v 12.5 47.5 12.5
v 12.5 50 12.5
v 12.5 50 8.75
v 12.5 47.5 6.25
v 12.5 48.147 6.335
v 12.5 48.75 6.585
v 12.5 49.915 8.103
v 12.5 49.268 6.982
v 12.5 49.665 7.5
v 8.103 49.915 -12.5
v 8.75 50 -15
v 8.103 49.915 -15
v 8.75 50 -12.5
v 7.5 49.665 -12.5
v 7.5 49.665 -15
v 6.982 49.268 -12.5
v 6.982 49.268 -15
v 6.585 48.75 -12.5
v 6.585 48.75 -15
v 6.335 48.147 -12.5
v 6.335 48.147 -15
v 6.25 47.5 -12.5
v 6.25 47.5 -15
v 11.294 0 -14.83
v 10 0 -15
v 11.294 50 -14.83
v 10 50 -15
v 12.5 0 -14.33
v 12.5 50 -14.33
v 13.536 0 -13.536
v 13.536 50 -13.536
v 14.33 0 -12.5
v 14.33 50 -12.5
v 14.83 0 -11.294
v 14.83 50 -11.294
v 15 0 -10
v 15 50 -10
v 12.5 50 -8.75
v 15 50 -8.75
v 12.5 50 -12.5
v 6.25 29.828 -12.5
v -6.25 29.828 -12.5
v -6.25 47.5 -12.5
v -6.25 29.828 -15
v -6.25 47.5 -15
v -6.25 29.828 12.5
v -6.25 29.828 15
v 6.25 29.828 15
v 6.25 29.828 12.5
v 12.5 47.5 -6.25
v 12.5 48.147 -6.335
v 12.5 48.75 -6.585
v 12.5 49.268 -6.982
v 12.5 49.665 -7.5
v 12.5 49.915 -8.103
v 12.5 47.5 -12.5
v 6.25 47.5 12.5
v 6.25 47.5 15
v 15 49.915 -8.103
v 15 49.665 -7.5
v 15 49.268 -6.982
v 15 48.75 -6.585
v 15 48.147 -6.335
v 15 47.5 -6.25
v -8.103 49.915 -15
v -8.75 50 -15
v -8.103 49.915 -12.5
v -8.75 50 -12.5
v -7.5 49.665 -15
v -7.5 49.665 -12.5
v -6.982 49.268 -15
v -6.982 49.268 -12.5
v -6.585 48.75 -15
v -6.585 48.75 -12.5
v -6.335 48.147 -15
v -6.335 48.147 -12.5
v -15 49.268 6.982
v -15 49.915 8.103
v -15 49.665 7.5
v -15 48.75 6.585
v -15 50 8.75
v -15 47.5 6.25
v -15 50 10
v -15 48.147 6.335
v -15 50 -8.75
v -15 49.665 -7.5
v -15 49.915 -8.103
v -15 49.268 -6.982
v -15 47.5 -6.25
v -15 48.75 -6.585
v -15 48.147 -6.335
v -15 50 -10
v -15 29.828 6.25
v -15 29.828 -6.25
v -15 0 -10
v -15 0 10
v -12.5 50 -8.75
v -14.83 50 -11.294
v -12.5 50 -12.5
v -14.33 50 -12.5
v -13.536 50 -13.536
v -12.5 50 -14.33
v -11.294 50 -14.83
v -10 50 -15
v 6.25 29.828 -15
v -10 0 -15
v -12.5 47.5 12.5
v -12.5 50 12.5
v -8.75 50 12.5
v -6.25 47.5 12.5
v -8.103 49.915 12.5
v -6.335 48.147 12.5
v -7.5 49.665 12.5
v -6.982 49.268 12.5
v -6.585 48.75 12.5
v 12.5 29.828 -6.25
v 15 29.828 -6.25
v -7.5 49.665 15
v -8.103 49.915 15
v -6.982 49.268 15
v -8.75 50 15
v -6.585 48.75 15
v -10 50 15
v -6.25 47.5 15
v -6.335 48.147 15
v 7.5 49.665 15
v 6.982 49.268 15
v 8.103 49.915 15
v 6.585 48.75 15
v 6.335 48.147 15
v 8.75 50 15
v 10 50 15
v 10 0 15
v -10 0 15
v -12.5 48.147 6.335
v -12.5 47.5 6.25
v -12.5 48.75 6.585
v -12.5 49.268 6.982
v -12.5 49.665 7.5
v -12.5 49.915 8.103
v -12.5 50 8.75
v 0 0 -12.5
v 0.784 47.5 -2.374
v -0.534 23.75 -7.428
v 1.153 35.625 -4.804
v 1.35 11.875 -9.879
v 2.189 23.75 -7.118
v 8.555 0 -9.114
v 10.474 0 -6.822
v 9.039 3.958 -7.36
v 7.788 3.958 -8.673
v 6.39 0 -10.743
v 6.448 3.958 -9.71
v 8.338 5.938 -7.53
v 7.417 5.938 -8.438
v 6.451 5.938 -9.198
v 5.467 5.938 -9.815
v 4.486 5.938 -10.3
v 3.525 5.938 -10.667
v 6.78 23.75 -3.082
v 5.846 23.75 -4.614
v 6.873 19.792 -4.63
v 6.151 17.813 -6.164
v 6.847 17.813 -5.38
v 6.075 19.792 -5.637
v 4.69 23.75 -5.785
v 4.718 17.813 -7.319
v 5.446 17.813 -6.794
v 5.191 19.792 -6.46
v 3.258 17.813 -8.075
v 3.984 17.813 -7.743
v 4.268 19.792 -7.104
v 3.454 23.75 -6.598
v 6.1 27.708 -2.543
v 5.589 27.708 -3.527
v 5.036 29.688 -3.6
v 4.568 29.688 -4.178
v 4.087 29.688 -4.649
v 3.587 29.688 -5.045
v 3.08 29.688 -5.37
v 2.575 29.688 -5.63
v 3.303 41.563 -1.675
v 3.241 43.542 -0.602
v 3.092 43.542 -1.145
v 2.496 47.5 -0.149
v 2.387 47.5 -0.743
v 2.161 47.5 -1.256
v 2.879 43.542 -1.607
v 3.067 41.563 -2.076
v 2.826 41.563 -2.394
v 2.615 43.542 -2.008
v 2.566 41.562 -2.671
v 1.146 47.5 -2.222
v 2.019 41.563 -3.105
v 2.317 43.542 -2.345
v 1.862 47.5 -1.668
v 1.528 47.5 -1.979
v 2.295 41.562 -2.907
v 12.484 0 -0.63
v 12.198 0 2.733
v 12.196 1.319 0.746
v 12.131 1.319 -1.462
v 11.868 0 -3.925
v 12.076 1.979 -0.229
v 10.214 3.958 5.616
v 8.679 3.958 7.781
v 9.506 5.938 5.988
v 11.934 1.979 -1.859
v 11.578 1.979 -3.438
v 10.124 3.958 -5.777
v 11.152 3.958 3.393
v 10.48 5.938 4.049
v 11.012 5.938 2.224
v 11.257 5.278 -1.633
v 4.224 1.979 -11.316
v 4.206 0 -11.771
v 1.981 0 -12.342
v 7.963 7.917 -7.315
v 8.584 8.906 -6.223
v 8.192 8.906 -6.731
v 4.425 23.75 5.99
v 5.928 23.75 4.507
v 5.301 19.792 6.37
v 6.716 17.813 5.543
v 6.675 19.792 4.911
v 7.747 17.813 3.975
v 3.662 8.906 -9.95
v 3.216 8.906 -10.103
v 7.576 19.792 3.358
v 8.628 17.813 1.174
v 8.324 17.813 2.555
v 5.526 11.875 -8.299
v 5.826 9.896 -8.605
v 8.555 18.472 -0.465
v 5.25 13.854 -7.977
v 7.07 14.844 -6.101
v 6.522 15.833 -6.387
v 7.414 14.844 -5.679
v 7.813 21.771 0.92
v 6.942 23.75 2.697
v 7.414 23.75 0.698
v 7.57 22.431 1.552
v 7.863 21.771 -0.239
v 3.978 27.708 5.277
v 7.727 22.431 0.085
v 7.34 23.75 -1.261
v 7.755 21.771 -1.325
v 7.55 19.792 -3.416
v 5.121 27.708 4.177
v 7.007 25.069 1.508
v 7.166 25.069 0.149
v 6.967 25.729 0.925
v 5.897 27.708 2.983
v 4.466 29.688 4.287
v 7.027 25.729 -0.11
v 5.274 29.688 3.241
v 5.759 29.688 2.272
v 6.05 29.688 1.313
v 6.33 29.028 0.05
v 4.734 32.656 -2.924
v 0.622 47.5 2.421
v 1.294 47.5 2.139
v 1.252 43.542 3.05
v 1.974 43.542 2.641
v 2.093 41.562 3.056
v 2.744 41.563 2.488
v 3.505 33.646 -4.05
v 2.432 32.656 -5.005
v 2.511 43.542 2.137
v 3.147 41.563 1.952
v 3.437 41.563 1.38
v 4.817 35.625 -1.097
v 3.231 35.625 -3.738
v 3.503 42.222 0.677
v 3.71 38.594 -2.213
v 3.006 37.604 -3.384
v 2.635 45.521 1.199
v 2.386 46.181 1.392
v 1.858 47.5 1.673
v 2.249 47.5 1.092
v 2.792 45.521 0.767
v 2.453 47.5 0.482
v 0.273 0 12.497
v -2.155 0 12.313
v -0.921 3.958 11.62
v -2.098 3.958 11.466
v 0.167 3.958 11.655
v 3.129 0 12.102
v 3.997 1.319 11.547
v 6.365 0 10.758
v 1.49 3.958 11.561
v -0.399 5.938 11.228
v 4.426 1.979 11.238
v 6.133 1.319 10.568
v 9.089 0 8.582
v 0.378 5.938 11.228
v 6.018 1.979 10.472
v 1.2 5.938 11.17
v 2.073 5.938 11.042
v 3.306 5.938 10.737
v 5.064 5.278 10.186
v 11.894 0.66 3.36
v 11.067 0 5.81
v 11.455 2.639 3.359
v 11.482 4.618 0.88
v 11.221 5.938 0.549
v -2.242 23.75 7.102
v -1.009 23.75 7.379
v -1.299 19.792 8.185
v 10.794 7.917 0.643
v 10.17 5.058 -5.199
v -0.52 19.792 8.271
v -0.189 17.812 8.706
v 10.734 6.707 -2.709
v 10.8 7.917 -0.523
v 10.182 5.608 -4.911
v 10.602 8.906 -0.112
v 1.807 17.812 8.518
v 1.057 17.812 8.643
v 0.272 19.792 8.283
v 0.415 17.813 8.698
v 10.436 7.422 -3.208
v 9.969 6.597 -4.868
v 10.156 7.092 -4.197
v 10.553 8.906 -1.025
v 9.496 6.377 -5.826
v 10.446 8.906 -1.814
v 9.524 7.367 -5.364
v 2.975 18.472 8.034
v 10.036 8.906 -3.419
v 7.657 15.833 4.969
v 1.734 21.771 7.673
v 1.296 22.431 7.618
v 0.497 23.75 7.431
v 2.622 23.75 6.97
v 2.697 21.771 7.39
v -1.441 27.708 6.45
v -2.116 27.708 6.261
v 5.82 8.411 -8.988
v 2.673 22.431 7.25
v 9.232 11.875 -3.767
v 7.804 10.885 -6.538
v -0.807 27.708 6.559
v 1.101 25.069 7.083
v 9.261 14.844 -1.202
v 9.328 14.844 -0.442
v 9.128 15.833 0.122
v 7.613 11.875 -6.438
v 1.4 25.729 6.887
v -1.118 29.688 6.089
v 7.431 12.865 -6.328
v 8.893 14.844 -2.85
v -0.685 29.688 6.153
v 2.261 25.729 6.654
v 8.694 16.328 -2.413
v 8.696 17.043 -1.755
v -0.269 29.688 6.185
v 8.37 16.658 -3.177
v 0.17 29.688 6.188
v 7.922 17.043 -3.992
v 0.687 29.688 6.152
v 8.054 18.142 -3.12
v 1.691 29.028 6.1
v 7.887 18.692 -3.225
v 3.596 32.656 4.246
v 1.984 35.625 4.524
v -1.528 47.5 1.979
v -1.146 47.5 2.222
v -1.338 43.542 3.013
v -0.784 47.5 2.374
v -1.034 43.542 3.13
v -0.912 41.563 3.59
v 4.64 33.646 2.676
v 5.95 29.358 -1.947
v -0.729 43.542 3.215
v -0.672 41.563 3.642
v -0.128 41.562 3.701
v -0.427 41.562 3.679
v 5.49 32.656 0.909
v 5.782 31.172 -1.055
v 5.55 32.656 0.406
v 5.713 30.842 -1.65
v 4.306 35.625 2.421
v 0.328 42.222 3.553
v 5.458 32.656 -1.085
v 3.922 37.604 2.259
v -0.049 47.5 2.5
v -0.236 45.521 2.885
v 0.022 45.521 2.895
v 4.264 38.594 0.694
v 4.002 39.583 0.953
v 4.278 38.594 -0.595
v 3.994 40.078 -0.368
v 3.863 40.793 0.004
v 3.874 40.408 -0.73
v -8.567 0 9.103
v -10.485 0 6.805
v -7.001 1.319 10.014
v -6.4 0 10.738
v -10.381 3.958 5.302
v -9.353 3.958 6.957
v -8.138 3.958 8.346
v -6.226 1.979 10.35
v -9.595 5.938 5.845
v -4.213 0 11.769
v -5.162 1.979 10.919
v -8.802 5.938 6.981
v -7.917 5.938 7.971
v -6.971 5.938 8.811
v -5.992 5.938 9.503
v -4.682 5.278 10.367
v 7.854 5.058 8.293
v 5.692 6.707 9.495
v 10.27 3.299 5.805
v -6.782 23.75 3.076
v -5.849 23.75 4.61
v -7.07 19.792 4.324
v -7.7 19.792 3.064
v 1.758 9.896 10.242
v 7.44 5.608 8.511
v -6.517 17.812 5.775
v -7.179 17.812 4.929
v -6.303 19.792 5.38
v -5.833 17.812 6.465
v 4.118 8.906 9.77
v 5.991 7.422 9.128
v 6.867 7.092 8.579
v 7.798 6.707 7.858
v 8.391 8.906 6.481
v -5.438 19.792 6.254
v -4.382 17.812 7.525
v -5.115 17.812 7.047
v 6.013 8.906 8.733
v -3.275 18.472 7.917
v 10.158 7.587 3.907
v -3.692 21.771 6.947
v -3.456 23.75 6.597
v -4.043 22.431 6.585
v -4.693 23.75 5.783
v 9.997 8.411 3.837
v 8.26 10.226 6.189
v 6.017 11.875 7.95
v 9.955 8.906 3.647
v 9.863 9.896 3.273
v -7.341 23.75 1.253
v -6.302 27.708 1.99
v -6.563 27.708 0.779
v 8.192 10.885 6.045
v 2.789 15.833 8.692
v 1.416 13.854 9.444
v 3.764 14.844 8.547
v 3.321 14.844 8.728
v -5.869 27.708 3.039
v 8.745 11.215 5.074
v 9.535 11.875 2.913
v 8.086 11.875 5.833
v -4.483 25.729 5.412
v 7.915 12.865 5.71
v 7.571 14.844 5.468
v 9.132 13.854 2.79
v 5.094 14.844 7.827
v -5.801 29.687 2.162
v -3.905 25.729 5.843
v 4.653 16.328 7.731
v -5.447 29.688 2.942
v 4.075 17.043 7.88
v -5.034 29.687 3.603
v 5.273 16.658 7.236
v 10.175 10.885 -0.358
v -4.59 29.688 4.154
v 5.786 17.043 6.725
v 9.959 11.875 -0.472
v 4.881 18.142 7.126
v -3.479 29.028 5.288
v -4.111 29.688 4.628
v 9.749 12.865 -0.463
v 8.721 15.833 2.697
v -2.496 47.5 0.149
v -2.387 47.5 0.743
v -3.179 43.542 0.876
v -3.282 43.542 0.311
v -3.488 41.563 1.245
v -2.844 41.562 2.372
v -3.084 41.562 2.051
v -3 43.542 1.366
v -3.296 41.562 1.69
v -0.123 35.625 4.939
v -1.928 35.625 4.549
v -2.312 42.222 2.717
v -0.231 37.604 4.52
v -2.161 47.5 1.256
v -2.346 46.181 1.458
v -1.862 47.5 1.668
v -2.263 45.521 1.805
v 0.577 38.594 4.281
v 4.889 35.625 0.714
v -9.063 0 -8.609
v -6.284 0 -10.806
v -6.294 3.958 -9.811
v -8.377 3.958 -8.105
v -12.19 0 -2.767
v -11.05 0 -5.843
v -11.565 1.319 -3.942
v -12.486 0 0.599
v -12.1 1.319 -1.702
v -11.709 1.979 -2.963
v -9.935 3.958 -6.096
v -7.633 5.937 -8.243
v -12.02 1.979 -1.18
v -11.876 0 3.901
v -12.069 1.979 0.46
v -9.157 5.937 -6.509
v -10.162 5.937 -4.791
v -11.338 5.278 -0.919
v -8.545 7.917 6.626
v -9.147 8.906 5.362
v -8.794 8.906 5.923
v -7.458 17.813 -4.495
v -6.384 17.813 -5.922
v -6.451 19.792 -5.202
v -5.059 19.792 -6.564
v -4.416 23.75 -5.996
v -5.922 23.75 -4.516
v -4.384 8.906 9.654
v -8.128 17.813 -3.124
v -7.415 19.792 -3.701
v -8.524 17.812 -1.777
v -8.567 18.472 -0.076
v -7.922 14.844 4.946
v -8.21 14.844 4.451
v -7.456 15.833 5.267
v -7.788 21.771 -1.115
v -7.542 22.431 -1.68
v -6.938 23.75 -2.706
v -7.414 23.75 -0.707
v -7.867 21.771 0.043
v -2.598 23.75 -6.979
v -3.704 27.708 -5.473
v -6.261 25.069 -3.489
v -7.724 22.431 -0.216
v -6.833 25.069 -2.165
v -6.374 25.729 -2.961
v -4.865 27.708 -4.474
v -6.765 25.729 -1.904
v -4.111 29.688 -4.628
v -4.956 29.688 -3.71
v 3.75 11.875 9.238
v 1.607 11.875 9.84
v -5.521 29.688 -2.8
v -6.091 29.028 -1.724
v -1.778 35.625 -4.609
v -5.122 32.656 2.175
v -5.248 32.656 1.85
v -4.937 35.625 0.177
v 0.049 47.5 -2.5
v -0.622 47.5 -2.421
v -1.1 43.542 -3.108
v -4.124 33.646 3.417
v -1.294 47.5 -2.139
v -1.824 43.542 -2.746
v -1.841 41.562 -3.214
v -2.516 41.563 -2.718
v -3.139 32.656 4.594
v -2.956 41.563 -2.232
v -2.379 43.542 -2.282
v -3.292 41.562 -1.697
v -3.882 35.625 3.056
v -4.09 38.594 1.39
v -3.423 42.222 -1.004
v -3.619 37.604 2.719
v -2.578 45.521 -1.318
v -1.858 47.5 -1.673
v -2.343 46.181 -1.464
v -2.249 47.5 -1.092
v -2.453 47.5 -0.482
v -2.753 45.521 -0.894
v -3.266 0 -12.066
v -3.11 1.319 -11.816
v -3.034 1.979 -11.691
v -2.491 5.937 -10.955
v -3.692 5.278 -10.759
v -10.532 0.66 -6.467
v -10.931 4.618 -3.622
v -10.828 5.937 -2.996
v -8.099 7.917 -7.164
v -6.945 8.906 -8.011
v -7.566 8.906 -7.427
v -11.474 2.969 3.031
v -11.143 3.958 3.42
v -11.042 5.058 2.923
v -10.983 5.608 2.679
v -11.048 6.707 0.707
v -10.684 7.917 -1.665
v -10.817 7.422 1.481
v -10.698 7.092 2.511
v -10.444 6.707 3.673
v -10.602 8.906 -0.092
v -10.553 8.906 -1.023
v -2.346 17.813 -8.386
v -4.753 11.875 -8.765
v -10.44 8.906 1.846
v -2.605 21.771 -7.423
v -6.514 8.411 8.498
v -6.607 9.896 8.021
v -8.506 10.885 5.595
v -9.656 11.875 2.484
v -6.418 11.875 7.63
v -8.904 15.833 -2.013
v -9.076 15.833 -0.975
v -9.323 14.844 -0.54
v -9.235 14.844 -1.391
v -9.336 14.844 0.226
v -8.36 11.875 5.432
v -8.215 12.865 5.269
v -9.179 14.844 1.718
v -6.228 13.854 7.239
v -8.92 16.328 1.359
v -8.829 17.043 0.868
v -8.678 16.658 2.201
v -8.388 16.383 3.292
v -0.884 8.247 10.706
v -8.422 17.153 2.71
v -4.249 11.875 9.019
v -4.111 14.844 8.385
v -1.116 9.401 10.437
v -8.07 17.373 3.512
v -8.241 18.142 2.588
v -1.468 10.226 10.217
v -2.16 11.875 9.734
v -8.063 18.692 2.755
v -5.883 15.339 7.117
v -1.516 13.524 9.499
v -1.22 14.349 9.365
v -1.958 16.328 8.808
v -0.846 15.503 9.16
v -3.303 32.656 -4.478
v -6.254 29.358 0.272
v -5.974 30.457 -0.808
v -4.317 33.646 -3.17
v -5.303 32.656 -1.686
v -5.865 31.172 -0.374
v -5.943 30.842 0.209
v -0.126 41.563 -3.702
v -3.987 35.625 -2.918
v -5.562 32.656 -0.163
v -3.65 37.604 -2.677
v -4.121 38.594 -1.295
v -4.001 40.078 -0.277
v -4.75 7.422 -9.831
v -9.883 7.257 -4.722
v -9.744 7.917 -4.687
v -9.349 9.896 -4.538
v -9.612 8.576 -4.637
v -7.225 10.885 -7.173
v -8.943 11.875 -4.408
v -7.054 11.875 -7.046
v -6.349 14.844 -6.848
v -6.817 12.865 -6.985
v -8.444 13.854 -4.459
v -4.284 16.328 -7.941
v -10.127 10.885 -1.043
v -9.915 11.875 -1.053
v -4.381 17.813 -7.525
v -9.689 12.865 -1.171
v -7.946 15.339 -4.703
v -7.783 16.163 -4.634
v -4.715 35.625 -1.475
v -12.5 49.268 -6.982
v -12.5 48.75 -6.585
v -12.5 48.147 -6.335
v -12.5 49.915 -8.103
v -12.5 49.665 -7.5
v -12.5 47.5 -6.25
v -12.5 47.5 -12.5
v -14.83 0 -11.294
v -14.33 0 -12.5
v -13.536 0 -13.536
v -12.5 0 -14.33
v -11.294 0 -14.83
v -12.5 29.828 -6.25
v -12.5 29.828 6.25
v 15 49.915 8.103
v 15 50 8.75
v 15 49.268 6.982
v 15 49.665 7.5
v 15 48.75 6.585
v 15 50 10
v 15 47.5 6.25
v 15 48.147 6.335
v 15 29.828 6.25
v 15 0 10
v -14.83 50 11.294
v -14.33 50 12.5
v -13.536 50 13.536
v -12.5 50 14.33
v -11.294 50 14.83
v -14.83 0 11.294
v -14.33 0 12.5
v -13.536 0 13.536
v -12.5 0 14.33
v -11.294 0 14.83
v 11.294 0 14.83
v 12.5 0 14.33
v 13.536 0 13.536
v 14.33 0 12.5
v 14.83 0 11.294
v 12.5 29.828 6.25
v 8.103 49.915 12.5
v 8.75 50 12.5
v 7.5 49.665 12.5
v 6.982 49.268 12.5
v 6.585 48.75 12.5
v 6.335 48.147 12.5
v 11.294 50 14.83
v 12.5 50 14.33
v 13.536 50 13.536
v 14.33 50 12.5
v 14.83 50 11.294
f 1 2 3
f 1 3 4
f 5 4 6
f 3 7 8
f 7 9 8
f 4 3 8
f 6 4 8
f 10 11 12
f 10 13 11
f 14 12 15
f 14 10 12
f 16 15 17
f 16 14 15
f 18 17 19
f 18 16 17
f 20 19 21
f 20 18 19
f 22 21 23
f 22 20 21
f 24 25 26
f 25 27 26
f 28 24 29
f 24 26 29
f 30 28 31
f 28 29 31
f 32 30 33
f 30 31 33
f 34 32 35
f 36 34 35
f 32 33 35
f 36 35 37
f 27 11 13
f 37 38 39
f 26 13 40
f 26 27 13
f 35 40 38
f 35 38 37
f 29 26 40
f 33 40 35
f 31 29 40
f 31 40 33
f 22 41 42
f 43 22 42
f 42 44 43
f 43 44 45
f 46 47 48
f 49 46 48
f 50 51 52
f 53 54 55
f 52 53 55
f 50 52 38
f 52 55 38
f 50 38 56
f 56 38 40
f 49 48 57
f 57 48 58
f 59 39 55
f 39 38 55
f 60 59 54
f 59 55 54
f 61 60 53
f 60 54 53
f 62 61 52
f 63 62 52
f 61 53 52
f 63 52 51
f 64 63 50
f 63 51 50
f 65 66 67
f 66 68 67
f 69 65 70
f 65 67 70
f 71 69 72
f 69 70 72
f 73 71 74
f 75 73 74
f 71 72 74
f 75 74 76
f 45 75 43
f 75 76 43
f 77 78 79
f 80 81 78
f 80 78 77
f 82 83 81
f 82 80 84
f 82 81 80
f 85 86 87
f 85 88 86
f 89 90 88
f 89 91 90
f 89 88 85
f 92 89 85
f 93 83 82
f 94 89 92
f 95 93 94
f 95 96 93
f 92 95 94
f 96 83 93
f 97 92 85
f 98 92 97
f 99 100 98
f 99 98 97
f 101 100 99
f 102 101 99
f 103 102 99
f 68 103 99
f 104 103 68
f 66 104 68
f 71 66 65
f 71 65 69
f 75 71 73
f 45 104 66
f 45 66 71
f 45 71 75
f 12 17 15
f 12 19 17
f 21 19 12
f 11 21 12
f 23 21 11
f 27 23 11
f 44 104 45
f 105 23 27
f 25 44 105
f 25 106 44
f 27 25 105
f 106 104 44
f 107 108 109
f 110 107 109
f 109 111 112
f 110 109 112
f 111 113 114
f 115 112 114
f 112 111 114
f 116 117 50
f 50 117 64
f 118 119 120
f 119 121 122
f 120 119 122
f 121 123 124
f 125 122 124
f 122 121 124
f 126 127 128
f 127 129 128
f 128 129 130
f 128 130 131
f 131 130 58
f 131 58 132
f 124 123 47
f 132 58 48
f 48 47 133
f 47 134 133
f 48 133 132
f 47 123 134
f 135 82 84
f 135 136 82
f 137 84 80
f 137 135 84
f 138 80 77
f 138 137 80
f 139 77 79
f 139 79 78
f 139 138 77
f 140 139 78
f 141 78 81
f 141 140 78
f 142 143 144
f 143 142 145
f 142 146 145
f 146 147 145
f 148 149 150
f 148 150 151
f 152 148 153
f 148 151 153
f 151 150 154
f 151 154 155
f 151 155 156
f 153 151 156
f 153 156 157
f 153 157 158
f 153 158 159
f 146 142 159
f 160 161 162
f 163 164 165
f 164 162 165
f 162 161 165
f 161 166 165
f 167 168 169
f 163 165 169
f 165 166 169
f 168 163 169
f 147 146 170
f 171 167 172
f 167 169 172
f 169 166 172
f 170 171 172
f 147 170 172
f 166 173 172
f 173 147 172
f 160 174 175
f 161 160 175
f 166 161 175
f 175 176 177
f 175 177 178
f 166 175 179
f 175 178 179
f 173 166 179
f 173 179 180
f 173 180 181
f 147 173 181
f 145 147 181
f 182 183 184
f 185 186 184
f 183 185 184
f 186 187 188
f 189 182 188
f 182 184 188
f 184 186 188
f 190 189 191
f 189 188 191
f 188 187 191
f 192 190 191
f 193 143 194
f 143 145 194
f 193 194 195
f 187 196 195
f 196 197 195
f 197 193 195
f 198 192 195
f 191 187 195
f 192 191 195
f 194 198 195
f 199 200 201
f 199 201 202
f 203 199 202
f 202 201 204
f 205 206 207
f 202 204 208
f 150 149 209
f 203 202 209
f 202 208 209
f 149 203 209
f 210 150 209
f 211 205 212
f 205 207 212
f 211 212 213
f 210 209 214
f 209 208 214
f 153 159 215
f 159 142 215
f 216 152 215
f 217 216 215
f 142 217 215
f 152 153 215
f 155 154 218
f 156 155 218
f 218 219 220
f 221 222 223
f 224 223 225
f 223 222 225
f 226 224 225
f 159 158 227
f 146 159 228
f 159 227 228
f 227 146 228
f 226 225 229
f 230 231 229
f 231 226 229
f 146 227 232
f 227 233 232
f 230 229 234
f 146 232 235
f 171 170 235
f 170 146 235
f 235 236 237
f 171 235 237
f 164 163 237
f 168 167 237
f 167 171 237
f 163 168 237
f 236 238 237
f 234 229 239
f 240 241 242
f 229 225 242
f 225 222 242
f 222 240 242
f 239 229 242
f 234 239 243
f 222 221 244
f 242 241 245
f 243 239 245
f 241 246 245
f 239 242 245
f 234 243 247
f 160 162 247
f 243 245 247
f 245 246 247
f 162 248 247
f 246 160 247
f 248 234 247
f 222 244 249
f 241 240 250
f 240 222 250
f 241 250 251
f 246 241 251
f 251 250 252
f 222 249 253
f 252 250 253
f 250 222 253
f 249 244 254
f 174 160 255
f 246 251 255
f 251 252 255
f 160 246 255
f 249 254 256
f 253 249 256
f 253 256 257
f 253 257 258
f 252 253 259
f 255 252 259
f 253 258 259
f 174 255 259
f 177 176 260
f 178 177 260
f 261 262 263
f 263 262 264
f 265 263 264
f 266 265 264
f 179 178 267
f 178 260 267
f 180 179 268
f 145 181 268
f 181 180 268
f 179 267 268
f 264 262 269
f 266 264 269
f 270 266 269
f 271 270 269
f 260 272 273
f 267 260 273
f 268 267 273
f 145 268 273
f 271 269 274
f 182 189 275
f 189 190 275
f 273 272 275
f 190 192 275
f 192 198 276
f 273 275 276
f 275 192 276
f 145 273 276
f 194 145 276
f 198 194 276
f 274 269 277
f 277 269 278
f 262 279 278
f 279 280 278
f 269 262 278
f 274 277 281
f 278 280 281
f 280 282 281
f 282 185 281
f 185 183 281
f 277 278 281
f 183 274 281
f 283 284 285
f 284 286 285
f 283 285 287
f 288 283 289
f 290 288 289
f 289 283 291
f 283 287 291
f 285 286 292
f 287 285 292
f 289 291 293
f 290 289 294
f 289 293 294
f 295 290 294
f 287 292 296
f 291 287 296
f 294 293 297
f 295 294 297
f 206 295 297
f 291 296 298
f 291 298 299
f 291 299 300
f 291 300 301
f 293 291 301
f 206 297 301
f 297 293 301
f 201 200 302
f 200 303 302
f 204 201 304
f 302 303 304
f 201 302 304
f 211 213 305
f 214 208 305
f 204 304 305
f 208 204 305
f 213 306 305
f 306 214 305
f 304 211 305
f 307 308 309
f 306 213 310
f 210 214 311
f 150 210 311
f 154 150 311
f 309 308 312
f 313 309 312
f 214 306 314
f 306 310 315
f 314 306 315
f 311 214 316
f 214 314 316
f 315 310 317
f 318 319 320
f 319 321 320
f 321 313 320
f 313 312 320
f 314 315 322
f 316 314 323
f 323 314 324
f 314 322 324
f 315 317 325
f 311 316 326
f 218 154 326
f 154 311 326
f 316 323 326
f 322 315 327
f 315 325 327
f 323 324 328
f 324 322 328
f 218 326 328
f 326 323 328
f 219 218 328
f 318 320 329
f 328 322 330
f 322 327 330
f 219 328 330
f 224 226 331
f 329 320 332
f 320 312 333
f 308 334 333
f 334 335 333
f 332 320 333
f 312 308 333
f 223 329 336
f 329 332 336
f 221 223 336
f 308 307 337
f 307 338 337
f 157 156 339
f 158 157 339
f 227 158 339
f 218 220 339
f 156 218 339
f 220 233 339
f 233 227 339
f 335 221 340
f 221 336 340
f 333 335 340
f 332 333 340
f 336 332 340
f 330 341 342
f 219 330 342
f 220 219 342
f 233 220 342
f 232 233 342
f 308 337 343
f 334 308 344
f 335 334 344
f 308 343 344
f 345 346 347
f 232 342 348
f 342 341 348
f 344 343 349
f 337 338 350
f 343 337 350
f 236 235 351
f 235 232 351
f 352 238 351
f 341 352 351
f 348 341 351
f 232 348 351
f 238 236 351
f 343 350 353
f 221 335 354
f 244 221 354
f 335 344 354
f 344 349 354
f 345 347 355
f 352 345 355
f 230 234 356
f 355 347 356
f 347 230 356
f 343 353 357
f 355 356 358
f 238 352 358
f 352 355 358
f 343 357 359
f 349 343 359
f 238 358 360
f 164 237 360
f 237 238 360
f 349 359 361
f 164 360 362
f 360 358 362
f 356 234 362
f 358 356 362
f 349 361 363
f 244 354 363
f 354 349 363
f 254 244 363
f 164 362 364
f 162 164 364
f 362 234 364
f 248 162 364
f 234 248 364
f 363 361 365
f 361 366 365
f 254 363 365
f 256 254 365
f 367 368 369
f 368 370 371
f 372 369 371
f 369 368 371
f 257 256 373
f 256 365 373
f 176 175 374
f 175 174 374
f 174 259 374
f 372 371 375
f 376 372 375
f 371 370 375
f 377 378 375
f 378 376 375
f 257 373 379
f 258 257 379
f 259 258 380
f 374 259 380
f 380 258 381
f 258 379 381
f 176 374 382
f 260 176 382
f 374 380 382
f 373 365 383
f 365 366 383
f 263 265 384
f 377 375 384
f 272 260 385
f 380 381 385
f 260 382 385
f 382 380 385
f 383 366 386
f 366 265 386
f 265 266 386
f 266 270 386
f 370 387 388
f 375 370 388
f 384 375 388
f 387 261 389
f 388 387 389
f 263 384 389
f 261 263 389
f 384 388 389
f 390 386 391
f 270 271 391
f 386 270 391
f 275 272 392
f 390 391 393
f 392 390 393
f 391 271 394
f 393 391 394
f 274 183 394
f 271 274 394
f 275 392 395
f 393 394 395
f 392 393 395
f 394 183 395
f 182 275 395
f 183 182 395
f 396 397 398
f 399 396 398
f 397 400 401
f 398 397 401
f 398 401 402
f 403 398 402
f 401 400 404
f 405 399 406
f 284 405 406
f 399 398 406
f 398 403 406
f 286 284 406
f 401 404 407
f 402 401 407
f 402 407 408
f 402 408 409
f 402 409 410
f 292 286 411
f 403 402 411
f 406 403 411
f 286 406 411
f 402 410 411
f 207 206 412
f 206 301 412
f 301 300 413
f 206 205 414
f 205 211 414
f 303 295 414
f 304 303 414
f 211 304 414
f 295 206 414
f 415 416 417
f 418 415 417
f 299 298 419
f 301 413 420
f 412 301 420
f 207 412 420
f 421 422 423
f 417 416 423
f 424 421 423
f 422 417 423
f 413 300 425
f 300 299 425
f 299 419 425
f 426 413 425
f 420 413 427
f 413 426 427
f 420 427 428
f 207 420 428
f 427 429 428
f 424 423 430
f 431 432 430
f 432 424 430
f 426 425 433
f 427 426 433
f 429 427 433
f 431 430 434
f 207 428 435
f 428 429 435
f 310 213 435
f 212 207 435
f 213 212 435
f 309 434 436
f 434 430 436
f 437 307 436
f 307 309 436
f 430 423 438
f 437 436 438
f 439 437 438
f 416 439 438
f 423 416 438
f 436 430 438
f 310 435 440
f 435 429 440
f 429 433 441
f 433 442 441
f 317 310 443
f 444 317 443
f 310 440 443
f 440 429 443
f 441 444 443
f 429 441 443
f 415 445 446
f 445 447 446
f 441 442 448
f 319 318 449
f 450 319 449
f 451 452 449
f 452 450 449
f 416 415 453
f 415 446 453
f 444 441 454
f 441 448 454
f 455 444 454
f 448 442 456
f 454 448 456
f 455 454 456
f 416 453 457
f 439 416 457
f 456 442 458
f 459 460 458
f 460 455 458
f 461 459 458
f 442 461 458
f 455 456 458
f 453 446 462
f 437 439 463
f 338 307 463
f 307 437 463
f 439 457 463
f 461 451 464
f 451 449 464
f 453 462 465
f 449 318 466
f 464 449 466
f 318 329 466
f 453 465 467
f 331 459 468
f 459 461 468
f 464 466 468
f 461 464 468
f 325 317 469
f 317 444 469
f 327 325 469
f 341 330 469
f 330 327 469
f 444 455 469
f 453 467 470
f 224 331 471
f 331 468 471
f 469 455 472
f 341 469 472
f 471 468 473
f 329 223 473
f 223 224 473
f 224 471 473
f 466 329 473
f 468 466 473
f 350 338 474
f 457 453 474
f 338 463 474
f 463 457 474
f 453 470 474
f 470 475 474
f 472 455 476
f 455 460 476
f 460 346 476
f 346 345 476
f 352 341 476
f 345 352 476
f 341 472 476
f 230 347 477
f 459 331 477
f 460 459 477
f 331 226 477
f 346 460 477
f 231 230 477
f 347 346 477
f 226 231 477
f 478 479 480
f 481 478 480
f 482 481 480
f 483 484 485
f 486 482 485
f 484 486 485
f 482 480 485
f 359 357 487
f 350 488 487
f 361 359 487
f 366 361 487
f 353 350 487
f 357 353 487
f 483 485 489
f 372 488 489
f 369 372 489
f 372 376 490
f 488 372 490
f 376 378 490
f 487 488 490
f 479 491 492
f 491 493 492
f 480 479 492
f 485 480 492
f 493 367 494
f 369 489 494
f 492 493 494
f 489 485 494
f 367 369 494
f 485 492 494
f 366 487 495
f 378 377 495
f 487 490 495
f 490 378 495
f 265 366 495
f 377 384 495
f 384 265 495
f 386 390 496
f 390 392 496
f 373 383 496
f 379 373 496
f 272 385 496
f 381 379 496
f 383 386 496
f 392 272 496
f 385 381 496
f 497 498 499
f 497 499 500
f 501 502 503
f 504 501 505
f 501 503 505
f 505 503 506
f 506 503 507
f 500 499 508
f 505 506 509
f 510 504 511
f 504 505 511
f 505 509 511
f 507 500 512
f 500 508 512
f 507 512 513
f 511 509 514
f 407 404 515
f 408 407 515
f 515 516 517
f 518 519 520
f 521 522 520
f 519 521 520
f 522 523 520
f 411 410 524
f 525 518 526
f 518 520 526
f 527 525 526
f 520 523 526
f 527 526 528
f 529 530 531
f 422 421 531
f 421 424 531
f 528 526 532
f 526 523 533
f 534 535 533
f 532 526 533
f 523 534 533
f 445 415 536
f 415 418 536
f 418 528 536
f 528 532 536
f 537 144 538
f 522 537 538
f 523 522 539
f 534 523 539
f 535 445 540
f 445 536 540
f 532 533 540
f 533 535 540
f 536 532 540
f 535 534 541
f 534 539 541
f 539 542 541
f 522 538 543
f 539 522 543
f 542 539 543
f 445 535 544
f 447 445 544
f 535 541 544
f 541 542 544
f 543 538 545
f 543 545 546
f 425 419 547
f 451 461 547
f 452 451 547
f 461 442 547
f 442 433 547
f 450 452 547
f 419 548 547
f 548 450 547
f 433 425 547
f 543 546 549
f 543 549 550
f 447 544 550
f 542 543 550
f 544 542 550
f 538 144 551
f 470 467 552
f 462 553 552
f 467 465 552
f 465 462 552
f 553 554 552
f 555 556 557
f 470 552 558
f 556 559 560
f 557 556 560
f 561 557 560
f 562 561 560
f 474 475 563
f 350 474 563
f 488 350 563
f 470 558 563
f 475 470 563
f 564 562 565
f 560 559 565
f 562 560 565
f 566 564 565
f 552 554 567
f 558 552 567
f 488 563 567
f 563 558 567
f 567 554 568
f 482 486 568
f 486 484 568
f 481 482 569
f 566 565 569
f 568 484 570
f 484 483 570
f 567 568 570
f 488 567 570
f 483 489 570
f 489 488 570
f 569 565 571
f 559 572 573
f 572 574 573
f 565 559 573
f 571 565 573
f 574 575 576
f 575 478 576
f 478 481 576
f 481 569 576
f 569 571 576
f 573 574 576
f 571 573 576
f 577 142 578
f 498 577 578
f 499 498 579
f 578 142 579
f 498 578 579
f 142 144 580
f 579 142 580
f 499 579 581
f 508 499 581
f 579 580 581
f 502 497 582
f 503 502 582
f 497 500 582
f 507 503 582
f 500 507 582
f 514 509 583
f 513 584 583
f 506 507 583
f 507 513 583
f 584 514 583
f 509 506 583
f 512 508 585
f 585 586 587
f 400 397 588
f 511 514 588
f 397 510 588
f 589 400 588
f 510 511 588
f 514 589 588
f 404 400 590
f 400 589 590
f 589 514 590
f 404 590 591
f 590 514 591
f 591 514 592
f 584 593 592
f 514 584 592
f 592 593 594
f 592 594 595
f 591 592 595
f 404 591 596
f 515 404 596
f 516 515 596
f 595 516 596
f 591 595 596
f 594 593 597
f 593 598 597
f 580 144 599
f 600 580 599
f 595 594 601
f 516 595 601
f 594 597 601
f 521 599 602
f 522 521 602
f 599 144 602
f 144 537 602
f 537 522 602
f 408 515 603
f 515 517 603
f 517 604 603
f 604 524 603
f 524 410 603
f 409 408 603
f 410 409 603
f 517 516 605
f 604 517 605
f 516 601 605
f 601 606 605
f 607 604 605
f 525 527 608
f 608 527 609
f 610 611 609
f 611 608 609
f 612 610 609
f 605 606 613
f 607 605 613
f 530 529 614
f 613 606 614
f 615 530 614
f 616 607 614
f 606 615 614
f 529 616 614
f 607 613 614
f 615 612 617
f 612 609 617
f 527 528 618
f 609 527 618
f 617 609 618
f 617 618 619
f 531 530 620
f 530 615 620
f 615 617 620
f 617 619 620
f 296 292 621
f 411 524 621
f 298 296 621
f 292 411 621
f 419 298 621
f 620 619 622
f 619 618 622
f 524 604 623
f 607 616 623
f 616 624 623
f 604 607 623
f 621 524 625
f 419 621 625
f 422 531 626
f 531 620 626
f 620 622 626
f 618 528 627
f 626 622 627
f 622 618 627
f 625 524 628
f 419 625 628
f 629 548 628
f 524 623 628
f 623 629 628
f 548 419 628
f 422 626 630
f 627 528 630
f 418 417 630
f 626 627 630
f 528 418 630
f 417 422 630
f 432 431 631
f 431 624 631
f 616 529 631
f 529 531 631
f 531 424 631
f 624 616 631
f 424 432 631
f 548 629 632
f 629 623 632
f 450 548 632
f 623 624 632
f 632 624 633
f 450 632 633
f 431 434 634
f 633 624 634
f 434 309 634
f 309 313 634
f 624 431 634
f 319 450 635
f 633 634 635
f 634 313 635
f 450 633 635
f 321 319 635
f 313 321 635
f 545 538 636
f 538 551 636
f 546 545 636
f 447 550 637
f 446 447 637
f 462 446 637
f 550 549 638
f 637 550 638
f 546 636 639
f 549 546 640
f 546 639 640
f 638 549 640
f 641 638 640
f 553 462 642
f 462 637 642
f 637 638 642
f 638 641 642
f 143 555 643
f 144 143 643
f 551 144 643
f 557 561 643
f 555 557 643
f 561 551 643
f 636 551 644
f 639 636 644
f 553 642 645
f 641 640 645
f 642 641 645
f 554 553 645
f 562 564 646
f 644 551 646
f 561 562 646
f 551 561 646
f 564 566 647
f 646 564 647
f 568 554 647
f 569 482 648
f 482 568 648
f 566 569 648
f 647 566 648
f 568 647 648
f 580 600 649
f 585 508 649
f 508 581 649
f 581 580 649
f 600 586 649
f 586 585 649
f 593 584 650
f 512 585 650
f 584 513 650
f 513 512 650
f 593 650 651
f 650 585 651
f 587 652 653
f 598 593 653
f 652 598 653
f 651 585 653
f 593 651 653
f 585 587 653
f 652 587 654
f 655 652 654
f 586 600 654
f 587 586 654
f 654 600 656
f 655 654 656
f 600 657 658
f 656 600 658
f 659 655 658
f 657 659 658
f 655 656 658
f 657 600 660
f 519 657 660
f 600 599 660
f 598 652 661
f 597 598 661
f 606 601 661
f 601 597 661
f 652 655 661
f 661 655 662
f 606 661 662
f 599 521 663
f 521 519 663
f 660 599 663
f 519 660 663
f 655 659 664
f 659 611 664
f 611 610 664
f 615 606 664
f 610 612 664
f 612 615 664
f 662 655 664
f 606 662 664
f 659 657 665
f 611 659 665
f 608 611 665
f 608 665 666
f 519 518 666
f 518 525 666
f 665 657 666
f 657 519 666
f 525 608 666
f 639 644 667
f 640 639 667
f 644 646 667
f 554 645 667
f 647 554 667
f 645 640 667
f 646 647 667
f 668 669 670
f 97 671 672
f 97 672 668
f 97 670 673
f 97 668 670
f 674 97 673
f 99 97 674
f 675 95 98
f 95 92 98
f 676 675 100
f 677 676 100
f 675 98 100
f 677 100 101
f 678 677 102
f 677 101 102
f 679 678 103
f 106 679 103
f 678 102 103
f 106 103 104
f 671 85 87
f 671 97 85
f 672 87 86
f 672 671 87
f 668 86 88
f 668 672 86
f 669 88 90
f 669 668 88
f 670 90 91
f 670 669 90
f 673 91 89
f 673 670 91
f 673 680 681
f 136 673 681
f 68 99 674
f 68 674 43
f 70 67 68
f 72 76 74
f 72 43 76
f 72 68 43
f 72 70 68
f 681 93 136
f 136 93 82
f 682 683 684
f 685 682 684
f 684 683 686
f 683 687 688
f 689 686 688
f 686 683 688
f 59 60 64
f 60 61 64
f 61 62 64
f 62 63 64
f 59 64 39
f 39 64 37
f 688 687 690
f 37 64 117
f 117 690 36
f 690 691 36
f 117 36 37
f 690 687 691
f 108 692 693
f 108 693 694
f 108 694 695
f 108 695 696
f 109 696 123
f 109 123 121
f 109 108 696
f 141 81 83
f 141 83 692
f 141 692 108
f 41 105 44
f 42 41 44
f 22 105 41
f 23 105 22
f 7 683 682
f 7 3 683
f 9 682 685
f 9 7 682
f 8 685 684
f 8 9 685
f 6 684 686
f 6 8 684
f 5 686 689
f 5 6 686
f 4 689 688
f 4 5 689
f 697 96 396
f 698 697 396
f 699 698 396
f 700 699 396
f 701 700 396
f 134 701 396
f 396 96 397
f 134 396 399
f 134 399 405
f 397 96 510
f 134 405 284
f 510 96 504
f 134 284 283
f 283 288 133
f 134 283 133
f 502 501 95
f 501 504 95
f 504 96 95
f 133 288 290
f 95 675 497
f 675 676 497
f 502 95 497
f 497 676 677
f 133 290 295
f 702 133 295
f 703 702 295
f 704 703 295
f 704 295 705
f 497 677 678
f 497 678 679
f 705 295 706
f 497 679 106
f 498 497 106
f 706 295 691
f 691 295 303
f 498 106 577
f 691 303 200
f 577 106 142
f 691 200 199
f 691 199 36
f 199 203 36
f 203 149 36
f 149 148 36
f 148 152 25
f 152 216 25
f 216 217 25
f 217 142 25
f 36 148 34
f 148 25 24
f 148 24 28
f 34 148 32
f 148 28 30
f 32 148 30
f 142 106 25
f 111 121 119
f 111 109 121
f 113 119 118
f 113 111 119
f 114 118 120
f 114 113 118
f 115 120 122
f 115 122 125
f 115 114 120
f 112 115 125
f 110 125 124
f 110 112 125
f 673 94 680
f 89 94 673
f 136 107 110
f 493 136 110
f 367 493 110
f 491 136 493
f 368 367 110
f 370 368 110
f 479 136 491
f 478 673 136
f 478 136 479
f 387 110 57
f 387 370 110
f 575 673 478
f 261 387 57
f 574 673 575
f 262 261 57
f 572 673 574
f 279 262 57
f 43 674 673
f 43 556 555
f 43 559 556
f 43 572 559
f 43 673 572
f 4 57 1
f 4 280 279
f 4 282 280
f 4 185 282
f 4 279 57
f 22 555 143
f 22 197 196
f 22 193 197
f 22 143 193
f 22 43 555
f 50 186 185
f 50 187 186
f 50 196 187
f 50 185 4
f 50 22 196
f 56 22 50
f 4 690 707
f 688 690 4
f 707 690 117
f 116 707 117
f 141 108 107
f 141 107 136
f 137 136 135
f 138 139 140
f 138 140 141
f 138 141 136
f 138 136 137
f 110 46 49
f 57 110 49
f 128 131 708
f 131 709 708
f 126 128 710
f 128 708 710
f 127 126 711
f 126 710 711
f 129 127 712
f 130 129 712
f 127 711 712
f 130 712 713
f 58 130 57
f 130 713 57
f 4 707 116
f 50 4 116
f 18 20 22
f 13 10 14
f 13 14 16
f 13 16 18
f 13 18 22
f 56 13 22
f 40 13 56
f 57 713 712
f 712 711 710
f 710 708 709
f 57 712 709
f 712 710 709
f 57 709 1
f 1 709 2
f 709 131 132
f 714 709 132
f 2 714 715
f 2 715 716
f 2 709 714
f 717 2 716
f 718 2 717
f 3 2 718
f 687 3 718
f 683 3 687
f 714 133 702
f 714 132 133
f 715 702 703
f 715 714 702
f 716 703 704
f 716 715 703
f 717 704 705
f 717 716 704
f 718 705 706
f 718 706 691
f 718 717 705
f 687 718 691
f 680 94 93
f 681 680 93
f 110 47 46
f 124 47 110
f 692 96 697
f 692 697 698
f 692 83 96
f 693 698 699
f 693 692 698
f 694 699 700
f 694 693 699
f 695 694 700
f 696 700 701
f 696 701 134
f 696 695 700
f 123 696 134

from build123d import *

# Parameters (mm, degrees)
SKETCH2_W           = 30
SKETCH2_H           = 30
BOSS_EXTRUDE1_DEPTH = 50
SKETCH3_W           = 25
SKETCH3_H           = 25
CUT_EXTRUDE1_DEPTH  = 2.5
FILLET1_R           = 5
SKETCH9_W           = 12.5
SKETCH9_H           = 20.172460503
CUT_EXTRUDE2_DEPTH  = 2.5
CIRPATTERN1_COUNT   = 4
FILLET2_R           = 2.5


with BuildPart() as part:
    # Sketch2 → Boss-Extrude1 (new body)
    with BuildSketch(Plane(origin=(0, 0, 0), x_dir=(1, 0, 0), z_dir=(0, 1, 0))):
        Rectangle(SKETCH2_W, SKETCH2_H)
    extrude(amount=BOSS_EXTRUDE1_DEPTH)

    # Sketch3 → Cut-Extrude1 (cut)
    with BuildSketch(Plane(origin=(0, 50, 0), x_dir=(1, 0, 0), z_dir=(0, 1, 0))):
        Rectangle(SKETCH3_W, SKETCH3_H)
    extrude(amount=-CUT_EXTRUDE1_DEPTH, mode=Mode.SUBTRACT)

    # Fillet1
    fillet1_edges = [part.edges().sort_by_distance(p)[0] for p in [
        (15, 25, 15),
        (-15, 25, 15),
        (-15, 25, -15),
        (15, 25, -15),
    ]]
    fillet(fillet1_edges, radius=FILLET1_R)

    # Cut-Loft2: read off the stored shape, not the designer's step
    # Cut-Loft2: loft between two sections, ruled curve by curve
    cut_loft2_from = [
        Edge.make_bspline([(0, 0, -12.5), (-25, 0, -12.5), (-25, 0, 12.5), (0, 0, 12.5), (25, 0, 12.5), (25, 0, -12.5), (0, 0, -12.5)], [0, 0, 0, 0, 0.5, 0.5, 0.5, 1, 1, 1, 1], 3, [1, 0.333333333, 0.333333333, 1, 0.333333333, 0.333333333, 1]),
    ]
    cut_loft2_to = [
        Edge.make_bspline([(0.784484005, 47.5, -2.373728048), (-3.962972092, 47.5, -3.942696057), (-5.531940101, 47.5, 0.804760039), (-0.784484005, 47.5, 2.373728048), (3.962972092, 47.5, 3.942696057), (5.531940101, 47.5, -0.804760039), (0.784484005, 47.5, -2.373728048)], [0, 0, 0, 0, 0.5, 0.5, 0.5, 1, 1, 1, 1], 3, [1, 0.333333333, 0.333333333, 1, 0.333333333, 0.333333333, 1]),
    ]
    cut_loft2 = Solid(Shell([*[Face.make_surface_from_curves(cut_loft2_from[k], cut_loft2_to[k]) for k in range(1)], Face(Wire(cut_loft2_from)), Face(Wire(cut_loft2_to))]))
    add(cut_loft2, mode=Mode.SUBTRACT)

    # Sketch9 → Cut-Extrude2 (cut)
    with BuildSketch(Plane.XY.offset(15)):
        with Locations((0, 39.913769749)):
            Rectangle(SKETCH9_W, SKETCH9_H)
    cut_extrude2 = extrude(amount=-CUT_EXTRUDE2_DEPTH, mode=Mode.SUBTRACT)

    # CirPattern1: Cut-Loft2, Cut-Extrude2 ×4 about axis
    cirpattern1_axis = Axis((0, 0, 0), (0, 1, 0))
    add([cut_loft2.rotate(cirpattern1_axis, i * 360 / CIRPATTERN1_COUNT) for i in range(1, CIRPATTERN1_COUNT)], mode=Mode.SUBTRACT)
    add([cut_extrude2.rotate(cirpattern1_axis, i * 360 / CIRPATTERN1_COUNT) for i in range(1, CIRPATTERN1_COUNT)], mode=Mode.SUBTRACT)

    # Fillet2
    fillet2_edges = [part.edges().sort_by_distance(p)[0] for p in [
        (13.75, 50, 6.25),
        (13.75, 50, -6.25),
        (6.25, 50, -13.75),
        (-6.25, 50, -13.75),
        (-13.75, 50, -6.25),
        (-13.75, 50, 6.25),
        (-6.25, 50, 13.75),
        (6.25, 50, 13.75),
    ]]
    fillet(fillet2_edges, radius=FILLET2_R)


solid = part.part
